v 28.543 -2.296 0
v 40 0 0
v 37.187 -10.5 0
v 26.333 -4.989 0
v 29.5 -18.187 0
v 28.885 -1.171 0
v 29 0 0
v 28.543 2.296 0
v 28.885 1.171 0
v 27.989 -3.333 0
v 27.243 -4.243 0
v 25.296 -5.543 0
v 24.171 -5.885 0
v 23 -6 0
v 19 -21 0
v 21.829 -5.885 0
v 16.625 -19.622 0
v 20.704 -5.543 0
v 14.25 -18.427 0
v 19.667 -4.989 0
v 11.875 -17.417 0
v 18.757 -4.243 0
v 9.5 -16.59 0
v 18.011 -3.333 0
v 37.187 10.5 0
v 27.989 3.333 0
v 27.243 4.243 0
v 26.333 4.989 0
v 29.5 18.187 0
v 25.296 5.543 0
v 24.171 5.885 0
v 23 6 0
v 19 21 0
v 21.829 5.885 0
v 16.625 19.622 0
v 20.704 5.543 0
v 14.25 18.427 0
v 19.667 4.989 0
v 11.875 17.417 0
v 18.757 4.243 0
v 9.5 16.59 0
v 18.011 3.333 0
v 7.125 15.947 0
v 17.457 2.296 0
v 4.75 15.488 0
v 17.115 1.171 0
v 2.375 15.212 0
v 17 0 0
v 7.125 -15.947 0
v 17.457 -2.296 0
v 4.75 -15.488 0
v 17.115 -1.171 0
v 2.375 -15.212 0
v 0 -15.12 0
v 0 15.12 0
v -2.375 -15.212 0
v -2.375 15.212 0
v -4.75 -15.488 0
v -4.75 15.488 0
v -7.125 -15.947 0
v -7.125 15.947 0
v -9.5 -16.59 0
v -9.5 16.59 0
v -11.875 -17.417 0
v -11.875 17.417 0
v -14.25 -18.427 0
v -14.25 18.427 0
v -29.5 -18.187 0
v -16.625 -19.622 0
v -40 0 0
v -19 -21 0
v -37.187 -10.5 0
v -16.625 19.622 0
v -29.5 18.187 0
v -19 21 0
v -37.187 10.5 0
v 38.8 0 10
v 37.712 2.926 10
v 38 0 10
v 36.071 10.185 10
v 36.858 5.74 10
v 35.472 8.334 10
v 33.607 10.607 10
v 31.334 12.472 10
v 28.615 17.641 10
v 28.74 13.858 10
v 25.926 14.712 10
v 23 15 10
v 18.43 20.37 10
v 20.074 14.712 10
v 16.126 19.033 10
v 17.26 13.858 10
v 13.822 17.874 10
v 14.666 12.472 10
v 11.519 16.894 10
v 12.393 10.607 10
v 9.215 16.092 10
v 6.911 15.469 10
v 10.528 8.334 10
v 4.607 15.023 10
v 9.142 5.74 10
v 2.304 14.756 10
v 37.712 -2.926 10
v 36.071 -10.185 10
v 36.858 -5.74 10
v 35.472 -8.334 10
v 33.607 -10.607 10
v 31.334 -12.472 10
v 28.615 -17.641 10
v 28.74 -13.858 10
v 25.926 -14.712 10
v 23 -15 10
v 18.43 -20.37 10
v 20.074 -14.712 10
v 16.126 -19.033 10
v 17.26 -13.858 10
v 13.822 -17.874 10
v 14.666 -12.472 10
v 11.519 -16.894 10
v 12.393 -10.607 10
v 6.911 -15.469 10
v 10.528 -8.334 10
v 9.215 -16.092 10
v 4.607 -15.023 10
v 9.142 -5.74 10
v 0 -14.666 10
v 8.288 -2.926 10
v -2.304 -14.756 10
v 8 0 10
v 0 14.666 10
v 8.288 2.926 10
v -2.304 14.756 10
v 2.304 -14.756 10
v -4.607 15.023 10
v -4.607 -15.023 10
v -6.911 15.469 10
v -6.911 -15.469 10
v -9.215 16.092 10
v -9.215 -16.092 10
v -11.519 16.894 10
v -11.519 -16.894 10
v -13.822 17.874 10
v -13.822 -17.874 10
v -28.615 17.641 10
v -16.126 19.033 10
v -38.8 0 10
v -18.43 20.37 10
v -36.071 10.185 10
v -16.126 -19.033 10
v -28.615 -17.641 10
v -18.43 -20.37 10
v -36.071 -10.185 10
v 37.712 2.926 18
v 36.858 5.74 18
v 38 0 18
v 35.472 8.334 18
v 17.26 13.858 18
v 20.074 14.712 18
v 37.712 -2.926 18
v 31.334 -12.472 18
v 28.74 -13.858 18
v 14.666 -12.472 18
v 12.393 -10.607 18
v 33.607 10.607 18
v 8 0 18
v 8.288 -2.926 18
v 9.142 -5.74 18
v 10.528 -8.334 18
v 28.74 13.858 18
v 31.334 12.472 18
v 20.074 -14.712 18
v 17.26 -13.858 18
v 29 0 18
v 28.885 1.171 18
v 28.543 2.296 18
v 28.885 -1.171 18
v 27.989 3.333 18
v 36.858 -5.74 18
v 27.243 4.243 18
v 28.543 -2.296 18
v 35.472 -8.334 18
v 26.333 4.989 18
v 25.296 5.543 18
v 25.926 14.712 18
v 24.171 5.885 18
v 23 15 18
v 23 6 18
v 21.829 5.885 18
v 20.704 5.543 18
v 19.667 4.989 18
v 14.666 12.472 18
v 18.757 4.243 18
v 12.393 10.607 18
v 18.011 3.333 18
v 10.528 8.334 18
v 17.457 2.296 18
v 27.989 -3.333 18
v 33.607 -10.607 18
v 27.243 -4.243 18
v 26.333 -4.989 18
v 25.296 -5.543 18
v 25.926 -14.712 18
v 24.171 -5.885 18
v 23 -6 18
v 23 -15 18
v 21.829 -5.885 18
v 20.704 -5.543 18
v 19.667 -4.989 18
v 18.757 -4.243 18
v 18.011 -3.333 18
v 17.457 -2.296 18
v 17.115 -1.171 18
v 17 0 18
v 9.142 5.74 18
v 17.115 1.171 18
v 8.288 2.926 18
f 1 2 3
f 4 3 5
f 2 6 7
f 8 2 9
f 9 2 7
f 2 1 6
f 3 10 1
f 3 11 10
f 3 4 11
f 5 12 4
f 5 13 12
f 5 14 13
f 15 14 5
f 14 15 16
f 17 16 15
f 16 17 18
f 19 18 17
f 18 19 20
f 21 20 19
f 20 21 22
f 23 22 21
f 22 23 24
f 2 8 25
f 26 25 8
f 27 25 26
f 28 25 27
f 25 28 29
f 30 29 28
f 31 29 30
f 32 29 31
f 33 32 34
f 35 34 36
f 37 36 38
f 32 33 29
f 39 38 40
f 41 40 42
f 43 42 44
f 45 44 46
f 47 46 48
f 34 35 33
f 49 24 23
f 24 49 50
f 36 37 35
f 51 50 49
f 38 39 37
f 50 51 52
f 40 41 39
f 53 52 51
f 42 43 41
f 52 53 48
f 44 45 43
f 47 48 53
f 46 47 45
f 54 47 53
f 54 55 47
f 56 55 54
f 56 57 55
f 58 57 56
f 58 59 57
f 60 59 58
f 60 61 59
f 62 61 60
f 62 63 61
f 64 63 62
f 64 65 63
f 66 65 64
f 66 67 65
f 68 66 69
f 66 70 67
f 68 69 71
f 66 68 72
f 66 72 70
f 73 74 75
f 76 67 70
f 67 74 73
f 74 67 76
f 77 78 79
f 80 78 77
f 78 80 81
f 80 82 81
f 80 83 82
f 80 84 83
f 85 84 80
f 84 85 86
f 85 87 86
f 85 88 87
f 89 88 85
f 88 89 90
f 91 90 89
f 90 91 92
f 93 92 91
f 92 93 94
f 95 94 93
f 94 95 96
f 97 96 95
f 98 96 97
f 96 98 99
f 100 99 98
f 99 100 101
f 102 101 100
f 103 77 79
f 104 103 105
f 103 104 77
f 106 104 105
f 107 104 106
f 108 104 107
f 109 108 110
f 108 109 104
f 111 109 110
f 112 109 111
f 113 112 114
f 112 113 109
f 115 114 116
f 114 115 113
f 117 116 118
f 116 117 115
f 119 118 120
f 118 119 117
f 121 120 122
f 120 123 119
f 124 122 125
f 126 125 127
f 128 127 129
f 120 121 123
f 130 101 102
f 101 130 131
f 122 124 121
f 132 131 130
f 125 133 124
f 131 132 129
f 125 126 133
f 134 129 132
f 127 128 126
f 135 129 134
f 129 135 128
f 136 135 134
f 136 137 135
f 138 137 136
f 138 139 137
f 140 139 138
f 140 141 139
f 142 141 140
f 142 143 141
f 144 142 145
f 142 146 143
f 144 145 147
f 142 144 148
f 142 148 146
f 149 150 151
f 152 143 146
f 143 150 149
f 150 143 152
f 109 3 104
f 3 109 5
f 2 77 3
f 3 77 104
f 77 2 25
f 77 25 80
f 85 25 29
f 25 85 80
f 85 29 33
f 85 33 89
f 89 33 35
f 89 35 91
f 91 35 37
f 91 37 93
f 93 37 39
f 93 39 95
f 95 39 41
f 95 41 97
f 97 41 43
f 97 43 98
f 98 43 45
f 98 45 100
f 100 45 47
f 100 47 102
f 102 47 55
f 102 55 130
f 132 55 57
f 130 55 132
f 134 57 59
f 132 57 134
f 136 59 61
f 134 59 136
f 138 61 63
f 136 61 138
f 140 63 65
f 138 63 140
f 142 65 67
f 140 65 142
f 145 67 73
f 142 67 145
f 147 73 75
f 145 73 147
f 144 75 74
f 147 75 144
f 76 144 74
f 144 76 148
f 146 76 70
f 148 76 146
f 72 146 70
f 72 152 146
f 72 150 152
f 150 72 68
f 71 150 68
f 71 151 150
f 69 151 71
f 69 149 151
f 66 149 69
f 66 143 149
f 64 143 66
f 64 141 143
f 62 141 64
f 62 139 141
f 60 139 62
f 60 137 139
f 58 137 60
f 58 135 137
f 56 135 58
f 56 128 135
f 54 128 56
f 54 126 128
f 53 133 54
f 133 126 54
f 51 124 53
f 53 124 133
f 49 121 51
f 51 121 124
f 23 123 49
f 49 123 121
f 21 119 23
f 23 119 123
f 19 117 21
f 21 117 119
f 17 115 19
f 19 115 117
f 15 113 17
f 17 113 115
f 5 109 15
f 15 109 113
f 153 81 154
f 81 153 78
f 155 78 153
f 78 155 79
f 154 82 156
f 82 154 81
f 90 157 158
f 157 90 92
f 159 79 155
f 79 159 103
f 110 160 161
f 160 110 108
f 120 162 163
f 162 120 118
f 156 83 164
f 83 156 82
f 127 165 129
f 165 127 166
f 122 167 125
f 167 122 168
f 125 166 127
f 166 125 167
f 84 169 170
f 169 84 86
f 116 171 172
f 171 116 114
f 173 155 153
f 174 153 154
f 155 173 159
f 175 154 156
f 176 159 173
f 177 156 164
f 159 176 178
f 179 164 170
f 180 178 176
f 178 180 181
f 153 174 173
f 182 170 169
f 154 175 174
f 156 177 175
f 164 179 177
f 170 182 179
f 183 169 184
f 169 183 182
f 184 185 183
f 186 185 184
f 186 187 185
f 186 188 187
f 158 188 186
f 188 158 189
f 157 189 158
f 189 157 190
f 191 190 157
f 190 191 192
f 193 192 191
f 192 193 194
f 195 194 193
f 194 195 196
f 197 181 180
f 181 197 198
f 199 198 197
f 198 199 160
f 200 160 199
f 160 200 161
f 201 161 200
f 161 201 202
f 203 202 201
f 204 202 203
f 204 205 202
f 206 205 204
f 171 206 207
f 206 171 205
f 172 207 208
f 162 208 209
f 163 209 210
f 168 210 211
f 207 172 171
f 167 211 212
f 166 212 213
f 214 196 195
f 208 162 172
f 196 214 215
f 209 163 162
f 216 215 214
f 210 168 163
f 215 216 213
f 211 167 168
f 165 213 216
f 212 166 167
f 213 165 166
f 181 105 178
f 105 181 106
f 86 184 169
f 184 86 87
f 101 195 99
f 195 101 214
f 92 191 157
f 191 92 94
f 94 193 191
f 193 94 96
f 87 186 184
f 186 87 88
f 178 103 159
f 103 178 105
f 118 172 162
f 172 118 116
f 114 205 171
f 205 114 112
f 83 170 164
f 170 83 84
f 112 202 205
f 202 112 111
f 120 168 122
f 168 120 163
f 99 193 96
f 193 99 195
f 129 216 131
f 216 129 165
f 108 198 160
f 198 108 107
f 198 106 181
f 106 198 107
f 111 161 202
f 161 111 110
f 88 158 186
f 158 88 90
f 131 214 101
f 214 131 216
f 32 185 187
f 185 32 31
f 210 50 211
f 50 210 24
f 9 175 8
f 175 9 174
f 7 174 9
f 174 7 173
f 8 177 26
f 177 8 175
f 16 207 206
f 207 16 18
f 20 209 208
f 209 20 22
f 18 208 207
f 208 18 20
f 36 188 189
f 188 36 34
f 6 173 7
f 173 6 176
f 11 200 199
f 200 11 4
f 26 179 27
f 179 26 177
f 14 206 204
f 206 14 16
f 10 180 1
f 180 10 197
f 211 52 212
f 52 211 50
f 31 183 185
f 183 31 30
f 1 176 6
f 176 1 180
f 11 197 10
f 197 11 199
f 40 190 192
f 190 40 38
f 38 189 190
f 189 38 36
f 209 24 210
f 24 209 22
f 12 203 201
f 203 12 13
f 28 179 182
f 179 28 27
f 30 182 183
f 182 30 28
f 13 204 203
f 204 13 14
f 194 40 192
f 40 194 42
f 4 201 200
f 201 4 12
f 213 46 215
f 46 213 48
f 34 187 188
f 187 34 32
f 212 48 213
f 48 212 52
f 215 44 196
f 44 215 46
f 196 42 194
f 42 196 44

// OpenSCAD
$fn = 32;

// ----------------------------------------------------------------------
// Handle: 80 x 42 mm grip, 10 mm thick
// ----------------------------------------------------------------------

// --- parameters (mm) ---
length = 80;              // grip length
width = 42;               // grip width
thickness = 10;           // grip thickness
waist = 0.72;             // width factor at the middle
draft = 0.97;             // top face scale of the extrusion
boss_d = 30;              // mounting boss diameter
boss_h = 8;               // mounting boss height
boss_hole_d = 12;         // screw clearance through the boss
boss_r = 23;              // boss centre from the grip centre

/* ergonomic grip outline, closed spline-like polygon in the XY plane */
grip = [[-19, 21], [-16.625, 19.622], [-14.25, 18.427], [-11.875, 17.417], [-9.5, 16.59], [-7.125, 15.947], [-4.75, 15.488], [-2.375, 15.212], [0, 15.12], [2.375, 15.212], [4.75, 15.488], [7.125, 15.947], [9.5, 16.59], [11.875, 17.417], [14.25, 18.427], [16.625, 19.622], [19, 21], [29.5, 18.187], [37.187, 10.5], [40, 0], [37.187, -10.5], [29.5, -18.187], [19, -21], [19, -21], [16.625, -19.622], [14.25, -18.427], [11.875, -17.417], [9.5, -16.59], [7.125, -15.947], [4.75, -15.488], [2.375, -15.212], [0, -15.12], [-2.375, -15.212], [-4.75, -15.488], [-7.125, -15.947], [-9.5, -16.59], [-11.875, -17.417], [-14.25, -18.427], [-16.625, -19.622], [-19, -21], [-29.5, -18.187], [-37.187, -10.5], [-40, 0], [-37.187, 10.5], [-29.5, 18.187], [-19, 21]];

module grip_body() {
  linear_extrude(height = thickness, scale = draft) polygon(grip);
}

module boss_body() {
  /* sunk 1 mm into the grip so the joint overlaps */
  translate([boss_r, 0, thickness - 1]) cylinder(h = boss_h + 1, d = boss_d);
}

difference() {
  union() {
    grip_body();
    boss_body();
  }
  translate([boss_r, 0, -1]) cylinder(h = thickness + boss_h + 2, d = boss_hole_d);
}
